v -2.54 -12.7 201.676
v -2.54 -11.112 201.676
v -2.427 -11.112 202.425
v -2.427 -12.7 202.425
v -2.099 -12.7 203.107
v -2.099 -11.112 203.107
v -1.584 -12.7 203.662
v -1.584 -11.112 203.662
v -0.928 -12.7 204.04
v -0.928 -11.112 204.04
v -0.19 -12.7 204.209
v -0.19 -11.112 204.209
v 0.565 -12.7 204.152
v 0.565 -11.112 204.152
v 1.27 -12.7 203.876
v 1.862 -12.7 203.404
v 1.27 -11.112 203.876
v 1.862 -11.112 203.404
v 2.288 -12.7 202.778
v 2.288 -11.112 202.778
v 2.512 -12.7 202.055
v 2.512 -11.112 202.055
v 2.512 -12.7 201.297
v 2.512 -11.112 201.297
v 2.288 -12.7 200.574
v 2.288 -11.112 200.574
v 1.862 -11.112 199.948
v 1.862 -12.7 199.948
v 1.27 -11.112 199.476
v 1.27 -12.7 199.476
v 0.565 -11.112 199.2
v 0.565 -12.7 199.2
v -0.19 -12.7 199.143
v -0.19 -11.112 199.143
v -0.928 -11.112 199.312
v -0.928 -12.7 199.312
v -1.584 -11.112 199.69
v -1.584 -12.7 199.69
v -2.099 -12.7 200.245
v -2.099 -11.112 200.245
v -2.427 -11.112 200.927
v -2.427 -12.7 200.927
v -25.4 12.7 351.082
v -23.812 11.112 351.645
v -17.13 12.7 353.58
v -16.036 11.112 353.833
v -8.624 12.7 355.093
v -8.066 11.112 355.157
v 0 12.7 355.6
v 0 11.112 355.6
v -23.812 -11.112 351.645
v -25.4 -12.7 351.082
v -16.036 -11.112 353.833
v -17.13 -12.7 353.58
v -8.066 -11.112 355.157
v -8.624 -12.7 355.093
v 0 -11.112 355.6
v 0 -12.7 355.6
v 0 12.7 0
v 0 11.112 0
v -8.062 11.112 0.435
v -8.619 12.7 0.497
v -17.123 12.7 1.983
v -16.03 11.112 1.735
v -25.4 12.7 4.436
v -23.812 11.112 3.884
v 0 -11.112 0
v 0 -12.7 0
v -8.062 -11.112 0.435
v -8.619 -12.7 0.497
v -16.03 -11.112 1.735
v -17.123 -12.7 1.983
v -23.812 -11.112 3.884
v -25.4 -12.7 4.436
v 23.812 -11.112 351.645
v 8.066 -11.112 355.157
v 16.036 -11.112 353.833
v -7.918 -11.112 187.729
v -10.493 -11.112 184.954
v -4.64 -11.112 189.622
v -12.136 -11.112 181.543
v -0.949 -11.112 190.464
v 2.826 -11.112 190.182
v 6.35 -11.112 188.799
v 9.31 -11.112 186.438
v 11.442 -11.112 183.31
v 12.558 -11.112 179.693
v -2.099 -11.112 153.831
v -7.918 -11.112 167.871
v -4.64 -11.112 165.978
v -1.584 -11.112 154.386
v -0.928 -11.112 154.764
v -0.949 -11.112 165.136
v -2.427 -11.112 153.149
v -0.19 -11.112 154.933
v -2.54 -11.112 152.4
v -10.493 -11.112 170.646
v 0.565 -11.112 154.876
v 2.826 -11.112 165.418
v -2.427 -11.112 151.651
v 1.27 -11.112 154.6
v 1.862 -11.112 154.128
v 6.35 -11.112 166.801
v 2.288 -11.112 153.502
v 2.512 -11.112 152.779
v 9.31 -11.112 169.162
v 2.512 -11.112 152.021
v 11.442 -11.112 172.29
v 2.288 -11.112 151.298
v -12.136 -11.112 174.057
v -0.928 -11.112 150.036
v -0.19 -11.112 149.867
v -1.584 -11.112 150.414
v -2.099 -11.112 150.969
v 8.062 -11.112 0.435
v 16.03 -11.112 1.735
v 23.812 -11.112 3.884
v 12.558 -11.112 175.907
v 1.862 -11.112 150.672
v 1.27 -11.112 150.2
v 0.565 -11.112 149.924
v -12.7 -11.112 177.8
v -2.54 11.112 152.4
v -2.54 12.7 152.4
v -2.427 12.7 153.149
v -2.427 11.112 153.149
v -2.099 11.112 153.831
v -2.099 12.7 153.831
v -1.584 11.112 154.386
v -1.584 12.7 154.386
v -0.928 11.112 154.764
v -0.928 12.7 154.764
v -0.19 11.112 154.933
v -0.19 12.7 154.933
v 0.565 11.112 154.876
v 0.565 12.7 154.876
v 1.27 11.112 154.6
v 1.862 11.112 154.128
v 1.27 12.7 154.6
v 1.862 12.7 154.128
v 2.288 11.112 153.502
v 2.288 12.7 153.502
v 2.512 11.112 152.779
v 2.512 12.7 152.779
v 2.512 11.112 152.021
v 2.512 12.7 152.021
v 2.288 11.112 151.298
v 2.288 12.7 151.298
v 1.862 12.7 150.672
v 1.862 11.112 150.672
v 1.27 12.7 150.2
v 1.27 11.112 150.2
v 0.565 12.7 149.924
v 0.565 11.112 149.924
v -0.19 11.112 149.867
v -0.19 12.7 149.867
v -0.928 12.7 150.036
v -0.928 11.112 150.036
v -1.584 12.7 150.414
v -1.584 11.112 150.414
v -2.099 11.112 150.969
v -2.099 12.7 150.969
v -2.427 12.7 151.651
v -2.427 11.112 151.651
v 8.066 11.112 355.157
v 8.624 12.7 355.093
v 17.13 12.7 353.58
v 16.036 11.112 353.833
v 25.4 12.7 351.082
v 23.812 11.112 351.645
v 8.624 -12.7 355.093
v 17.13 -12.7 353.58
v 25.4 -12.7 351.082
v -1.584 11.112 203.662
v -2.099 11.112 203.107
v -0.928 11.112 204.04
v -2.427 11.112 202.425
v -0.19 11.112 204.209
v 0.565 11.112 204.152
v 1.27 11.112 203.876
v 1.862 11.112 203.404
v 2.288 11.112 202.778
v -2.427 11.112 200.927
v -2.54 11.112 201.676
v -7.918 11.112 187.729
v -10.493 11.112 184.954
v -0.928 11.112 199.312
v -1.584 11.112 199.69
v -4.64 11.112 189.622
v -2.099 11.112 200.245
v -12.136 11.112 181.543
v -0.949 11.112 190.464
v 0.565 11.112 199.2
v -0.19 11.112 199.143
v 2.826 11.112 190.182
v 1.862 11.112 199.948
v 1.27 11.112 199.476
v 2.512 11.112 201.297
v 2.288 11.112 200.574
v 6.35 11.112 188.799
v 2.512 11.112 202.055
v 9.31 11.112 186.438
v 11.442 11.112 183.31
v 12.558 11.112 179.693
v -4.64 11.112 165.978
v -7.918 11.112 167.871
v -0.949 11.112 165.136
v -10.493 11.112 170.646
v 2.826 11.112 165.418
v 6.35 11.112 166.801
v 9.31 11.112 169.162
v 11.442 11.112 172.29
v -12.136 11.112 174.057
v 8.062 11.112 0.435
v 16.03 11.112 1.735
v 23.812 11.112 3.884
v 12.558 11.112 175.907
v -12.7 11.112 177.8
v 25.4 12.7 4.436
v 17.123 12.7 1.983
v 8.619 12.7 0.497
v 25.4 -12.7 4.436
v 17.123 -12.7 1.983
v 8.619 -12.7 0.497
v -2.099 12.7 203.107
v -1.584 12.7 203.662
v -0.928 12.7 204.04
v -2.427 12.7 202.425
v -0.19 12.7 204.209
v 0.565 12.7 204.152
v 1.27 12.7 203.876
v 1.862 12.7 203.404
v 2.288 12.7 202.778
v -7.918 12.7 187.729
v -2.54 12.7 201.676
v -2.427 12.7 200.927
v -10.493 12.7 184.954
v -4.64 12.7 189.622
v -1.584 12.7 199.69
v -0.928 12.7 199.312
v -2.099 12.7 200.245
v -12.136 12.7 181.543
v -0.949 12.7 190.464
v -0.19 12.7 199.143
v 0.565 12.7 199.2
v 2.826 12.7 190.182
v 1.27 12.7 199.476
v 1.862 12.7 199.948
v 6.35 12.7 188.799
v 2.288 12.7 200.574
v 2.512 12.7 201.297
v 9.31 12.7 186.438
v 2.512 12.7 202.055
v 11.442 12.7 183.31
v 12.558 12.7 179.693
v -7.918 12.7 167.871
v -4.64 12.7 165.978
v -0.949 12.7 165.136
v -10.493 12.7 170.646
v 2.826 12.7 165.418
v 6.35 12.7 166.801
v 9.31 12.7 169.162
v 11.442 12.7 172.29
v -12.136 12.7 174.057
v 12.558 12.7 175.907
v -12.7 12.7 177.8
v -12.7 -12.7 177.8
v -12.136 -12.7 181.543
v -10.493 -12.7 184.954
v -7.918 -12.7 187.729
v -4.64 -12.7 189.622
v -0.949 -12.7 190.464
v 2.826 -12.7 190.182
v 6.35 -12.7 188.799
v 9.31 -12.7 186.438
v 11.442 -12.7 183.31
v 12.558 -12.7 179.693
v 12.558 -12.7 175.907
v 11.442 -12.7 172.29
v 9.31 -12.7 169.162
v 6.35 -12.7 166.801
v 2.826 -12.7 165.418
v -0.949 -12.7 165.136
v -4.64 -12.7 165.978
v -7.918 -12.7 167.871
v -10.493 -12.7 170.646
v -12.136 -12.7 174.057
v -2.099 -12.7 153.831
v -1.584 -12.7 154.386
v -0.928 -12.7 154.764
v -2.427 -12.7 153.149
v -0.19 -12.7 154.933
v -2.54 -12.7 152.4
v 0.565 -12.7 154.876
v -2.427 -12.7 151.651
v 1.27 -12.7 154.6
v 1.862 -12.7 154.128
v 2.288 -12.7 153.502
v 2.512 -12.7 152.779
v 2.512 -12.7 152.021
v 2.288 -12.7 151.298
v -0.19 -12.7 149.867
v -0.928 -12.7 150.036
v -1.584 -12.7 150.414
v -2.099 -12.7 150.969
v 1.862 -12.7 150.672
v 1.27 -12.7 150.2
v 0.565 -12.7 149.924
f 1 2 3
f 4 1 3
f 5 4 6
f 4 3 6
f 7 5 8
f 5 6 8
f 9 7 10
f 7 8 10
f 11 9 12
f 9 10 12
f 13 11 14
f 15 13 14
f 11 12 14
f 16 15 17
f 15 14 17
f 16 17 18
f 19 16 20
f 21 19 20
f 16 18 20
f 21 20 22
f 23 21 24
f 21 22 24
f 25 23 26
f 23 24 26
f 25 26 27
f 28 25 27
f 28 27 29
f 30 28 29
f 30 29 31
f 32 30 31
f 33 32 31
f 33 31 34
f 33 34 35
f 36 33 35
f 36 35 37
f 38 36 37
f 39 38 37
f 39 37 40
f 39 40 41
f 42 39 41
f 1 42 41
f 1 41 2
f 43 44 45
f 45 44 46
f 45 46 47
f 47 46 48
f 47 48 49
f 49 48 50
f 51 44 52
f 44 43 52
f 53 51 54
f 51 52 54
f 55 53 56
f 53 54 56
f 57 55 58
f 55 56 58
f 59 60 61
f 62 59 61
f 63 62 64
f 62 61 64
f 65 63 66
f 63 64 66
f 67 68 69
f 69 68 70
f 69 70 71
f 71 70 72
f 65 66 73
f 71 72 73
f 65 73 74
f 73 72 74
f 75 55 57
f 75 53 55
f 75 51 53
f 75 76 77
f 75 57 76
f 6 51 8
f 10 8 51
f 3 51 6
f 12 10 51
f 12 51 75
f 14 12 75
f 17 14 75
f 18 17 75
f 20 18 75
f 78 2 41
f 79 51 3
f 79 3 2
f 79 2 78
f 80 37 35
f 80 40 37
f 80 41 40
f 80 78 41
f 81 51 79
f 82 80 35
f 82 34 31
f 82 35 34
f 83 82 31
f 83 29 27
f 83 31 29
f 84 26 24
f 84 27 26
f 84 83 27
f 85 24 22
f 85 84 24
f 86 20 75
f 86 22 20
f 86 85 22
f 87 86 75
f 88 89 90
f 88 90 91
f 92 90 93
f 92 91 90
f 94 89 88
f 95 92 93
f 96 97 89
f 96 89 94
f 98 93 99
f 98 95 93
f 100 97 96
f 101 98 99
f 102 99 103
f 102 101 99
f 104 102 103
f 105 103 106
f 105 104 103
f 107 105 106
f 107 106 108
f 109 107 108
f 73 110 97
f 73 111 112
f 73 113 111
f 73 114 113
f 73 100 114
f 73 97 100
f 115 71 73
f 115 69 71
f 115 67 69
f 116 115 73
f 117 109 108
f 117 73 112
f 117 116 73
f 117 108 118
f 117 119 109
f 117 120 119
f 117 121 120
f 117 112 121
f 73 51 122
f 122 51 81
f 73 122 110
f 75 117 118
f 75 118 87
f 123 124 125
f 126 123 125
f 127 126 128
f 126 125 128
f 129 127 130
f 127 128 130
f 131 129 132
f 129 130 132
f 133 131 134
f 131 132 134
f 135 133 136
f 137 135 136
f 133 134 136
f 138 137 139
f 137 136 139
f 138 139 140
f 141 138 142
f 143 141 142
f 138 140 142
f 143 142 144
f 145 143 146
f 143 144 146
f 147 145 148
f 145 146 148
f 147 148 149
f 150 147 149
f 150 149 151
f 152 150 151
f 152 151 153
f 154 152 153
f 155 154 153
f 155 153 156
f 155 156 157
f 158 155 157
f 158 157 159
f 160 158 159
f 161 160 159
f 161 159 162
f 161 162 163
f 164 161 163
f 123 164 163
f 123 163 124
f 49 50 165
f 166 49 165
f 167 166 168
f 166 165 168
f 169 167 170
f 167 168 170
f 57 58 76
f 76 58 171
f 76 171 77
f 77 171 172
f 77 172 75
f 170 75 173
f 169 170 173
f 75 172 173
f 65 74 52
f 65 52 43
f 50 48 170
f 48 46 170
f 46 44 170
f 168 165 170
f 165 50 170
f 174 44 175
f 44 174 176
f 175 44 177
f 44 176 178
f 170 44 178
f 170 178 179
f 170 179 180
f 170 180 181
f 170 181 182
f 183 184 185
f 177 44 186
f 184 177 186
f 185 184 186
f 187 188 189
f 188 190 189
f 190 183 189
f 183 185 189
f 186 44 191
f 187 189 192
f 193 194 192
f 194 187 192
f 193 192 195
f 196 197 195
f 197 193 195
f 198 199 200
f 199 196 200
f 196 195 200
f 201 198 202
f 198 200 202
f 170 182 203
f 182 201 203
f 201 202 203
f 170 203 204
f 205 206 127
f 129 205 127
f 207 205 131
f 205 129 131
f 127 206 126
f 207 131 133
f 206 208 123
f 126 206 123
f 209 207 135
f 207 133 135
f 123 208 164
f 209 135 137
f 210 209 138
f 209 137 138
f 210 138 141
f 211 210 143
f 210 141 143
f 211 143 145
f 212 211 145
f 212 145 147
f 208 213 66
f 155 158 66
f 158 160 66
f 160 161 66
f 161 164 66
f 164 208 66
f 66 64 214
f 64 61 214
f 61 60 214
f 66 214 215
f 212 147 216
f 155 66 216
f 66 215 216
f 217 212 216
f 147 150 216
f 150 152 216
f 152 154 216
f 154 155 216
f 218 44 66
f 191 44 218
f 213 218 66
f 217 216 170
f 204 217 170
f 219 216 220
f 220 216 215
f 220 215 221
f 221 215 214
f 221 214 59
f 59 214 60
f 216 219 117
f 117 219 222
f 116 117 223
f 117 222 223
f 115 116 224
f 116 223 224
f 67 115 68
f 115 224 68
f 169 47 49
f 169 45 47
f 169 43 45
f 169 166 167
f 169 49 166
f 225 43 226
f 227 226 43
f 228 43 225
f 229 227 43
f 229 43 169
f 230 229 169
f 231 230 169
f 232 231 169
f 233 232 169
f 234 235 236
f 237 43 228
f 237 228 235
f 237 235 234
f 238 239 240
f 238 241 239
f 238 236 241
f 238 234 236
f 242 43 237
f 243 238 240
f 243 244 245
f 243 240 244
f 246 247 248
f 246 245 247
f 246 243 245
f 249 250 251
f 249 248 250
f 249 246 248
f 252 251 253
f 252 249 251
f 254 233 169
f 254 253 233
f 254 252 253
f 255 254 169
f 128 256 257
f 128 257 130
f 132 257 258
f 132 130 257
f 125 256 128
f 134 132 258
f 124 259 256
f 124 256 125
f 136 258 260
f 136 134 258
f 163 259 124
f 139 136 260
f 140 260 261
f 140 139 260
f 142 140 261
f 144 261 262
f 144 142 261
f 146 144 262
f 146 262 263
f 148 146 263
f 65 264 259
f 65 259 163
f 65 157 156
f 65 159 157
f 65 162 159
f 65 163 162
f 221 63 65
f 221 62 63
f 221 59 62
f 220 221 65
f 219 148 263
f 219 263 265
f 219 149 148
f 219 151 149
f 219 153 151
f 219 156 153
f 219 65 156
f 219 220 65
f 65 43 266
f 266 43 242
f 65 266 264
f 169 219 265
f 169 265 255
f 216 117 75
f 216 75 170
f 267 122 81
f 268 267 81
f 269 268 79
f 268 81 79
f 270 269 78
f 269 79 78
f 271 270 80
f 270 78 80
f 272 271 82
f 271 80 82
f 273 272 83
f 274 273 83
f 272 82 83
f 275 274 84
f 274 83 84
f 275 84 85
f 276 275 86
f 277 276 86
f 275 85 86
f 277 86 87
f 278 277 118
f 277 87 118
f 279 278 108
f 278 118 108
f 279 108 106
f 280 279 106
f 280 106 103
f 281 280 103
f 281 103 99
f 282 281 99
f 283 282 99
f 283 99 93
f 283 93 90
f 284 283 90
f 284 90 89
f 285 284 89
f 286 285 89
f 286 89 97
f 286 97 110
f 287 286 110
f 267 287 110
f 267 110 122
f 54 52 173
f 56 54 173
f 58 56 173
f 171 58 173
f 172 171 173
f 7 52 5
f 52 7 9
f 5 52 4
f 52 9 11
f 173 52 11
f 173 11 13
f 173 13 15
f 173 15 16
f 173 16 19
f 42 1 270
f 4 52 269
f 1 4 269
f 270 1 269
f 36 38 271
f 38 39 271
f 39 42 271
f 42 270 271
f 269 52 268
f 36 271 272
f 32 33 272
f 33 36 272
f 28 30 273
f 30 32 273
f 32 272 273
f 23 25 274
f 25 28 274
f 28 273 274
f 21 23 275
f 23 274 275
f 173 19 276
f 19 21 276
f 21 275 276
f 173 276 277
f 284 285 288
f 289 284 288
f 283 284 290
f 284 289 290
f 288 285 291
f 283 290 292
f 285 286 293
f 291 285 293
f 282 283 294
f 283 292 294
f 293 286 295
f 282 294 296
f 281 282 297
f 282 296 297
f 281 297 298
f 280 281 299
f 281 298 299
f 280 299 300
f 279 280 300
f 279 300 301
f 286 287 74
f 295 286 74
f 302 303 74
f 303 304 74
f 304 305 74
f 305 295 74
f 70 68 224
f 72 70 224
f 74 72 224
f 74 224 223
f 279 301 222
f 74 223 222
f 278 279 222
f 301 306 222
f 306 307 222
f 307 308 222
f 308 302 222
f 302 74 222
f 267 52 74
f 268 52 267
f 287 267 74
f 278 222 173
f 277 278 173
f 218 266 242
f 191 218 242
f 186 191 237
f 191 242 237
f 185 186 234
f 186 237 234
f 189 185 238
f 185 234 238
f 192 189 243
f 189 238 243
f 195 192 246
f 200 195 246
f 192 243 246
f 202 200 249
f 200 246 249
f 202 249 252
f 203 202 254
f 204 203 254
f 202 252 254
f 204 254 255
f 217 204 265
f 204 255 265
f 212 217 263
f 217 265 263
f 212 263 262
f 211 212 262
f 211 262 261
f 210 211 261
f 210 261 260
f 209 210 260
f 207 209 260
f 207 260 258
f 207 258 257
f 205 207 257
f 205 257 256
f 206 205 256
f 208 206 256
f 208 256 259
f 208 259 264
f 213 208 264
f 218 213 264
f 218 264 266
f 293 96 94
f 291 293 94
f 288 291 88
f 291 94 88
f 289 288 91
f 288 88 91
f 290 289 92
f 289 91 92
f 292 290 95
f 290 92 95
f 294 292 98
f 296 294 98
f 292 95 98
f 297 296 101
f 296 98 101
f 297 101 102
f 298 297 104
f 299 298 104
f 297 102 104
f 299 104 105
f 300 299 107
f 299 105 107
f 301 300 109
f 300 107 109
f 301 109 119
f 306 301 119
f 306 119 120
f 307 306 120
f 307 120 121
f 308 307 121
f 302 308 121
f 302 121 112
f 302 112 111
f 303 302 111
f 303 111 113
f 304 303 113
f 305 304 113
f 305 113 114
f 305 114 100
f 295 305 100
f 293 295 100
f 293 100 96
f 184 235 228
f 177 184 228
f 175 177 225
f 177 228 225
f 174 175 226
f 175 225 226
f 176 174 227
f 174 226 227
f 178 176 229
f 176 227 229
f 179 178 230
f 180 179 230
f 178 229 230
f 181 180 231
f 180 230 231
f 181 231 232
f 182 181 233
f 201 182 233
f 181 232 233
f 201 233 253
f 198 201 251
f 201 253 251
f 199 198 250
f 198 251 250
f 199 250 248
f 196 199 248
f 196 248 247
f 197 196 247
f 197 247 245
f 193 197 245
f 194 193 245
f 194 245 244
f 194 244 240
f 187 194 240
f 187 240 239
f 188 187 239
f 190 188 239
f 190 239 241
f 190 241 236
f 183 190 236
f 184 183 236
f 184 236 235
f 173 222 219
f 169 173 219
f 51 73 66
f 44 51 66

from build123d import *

# Parameters (mm, degrees)
SKETCH1_W           = 50.8
SKETCH1_H           = 25.4
SKETCH1_W_2         = 47.625
SKETCH1_H_2         = 22.225
BOSS_EXTRUDE1_DEPTH = 355.6
SKETCH2_R           = 12.7
SKETCH2_R_2         = 2.54
CUT_EXTRUDE4_DEPTH  = 32.766
CUT_EXTRUDE5_REACH  = 359.41


with BuildPart() as part:
    # Sketch1 → Boss-Extrude1 (new body)
    with BuildSketch(Plane.XY):
        Rectangle(SKETCH1_W, SKETCH1_H)
        Rectangle(SKETCH1_W_2, SKETCH1_H_2, mode=Mode.SUBTRACT)
    extrude(amount=BOSS_EXTRUDE1_DEPTH)

    # Sketch2 → Cut-Extrude4 (cut)
    with BuildSketch(Plane(origin=(0, 12.7, 0), x_dir=(1, 0, 0), z_dir=(0, 1, 0))):
        with Locations(Location((0, -177.8, 0), (0, 0, 180))):
            Circle(SKETCH2_R)
        with Locations(Location((0, -152.4, 0), (0, 0, 180))):
            Circle(SKETCH2_R_2)
        with Locations(Location((0, -201.676, 0), (0, 0, 180))):
            Circle(SKETCH2_R_2)
    extrude(amount=-CUT_EXTRUDE4_DEPTH, mode=Mode.SUBTRACT)

    # Sketch3 → Cut-Extrude5 (cut, up to next)
    with BuildSketch(Plane.XZ.offset(12.7), mode=Mode.PRIVATE) as cut_extrude5_sk1:
        with BuildLine():
            ThreePointArc((-4.48e-07, 355.6), (12.899331681, 354.46174048), (25.4, 351.082140551))
            Line((25.4, 351.082140551), (25.4, 355.6))
            Line((25.4, 355.6), (-4.48e-07, 355.6))
        make_face()
    cut_extrude5_tool1 = extrude(cut_extrude5_sk1.sketch, amount=-CUT_EXTRUDE5_REACH, mode=Mode.PRIVATE) & part.part
    # Sketch3 → Cut-Extrude5 (cut, up to next)
    with BuildSketch(Plane.XZ.offset(12.7), mode=Mode.PRIVATE) as cut_extrude5_sk2:
        with BuildLine():
            Line((-25.4, 355.6), (-25.4, 351.082140551))
            ThreePointArc((-25.4, 351.082140551), (-12.899332122, 354.461740401), (-4.48e-07, 355.6))
            Line((-4.48e-07, 355.6), (-25.4, 355.6))
        make_face()
    cut_extrude5_tool2 = extrude(cut_extrude5_sk2.sketch, amount=-CUT_EXTRUDE5_REACH, mode=Mode.PRIVATE) & part.part
    # Sketch3 → Cut-Extrude5 (cut, up to next)
    with BuildSketch(Plane.XZ.offset(12.7), mode=Mode.PRIVATE) as cut_extrude5_sk3:
        with BuildLine():
            ThreePointArc((25.4, 4.436419441), (12.892263223, 1.117437052), (-2.64e-07, 0))
            Line((-2.64e-07, 0), (25.4, 0))
            Line((25.4, 0), (25.4, 4.436419441))
        make_face()
    cut_extrude5_tool3 = extrude(cut_extrude5_sk3.sketch, amount=-CUT_EXTRUDE5_REACH, mode=Mode.PRIVATE) & part.part
    # Sketch3 → Cut-Extrude5 (cut, up to next)
    with BuildSketch(Plane.XZ.offset(12.7), mode=Mode.PRIVATE) as cut_extrude5_sk4:
        with BuildLine():
            Line((-25.4, 4.436419441), (-25.4, 0))
            Line((-25.4, 0), (-2.64e-07, 0))
            ThreePointArc((-2.64e-07, 0), (-12.892263483, 1.117437097), (-25.4, 4.436419441))
        make_face()
    cut_extrude5_tool4 = extrude(cut_extrude5_sk4.sketch, amount=-CUT_EXTRUDE5_REACH, mode=Mode.PRIVATE) & part.part
    add(cut_extrude5_tool1.solids().sort_by_distance((19.0896, -12.7, 354.252078))[0], mode=Mode.SUBTRACT)
    add(cut_extrude5_tool2.solids().sort_by_distance((-19.0896, -12.7, 354.252078))[0], mode=Mode.SUBTRACT)
    add(cut_extrude5_tool3.solids().sort_by_distance((19.088205, -12.7, 1.323888))[0], mode=Mode.SUBTRACT)
    add(cut_extrude5_tool4.solids().sort_by_distance((-19.088205, -12.7, 1.323888))[0], mode=Mode.SUBTRACT)


solid = part.part
